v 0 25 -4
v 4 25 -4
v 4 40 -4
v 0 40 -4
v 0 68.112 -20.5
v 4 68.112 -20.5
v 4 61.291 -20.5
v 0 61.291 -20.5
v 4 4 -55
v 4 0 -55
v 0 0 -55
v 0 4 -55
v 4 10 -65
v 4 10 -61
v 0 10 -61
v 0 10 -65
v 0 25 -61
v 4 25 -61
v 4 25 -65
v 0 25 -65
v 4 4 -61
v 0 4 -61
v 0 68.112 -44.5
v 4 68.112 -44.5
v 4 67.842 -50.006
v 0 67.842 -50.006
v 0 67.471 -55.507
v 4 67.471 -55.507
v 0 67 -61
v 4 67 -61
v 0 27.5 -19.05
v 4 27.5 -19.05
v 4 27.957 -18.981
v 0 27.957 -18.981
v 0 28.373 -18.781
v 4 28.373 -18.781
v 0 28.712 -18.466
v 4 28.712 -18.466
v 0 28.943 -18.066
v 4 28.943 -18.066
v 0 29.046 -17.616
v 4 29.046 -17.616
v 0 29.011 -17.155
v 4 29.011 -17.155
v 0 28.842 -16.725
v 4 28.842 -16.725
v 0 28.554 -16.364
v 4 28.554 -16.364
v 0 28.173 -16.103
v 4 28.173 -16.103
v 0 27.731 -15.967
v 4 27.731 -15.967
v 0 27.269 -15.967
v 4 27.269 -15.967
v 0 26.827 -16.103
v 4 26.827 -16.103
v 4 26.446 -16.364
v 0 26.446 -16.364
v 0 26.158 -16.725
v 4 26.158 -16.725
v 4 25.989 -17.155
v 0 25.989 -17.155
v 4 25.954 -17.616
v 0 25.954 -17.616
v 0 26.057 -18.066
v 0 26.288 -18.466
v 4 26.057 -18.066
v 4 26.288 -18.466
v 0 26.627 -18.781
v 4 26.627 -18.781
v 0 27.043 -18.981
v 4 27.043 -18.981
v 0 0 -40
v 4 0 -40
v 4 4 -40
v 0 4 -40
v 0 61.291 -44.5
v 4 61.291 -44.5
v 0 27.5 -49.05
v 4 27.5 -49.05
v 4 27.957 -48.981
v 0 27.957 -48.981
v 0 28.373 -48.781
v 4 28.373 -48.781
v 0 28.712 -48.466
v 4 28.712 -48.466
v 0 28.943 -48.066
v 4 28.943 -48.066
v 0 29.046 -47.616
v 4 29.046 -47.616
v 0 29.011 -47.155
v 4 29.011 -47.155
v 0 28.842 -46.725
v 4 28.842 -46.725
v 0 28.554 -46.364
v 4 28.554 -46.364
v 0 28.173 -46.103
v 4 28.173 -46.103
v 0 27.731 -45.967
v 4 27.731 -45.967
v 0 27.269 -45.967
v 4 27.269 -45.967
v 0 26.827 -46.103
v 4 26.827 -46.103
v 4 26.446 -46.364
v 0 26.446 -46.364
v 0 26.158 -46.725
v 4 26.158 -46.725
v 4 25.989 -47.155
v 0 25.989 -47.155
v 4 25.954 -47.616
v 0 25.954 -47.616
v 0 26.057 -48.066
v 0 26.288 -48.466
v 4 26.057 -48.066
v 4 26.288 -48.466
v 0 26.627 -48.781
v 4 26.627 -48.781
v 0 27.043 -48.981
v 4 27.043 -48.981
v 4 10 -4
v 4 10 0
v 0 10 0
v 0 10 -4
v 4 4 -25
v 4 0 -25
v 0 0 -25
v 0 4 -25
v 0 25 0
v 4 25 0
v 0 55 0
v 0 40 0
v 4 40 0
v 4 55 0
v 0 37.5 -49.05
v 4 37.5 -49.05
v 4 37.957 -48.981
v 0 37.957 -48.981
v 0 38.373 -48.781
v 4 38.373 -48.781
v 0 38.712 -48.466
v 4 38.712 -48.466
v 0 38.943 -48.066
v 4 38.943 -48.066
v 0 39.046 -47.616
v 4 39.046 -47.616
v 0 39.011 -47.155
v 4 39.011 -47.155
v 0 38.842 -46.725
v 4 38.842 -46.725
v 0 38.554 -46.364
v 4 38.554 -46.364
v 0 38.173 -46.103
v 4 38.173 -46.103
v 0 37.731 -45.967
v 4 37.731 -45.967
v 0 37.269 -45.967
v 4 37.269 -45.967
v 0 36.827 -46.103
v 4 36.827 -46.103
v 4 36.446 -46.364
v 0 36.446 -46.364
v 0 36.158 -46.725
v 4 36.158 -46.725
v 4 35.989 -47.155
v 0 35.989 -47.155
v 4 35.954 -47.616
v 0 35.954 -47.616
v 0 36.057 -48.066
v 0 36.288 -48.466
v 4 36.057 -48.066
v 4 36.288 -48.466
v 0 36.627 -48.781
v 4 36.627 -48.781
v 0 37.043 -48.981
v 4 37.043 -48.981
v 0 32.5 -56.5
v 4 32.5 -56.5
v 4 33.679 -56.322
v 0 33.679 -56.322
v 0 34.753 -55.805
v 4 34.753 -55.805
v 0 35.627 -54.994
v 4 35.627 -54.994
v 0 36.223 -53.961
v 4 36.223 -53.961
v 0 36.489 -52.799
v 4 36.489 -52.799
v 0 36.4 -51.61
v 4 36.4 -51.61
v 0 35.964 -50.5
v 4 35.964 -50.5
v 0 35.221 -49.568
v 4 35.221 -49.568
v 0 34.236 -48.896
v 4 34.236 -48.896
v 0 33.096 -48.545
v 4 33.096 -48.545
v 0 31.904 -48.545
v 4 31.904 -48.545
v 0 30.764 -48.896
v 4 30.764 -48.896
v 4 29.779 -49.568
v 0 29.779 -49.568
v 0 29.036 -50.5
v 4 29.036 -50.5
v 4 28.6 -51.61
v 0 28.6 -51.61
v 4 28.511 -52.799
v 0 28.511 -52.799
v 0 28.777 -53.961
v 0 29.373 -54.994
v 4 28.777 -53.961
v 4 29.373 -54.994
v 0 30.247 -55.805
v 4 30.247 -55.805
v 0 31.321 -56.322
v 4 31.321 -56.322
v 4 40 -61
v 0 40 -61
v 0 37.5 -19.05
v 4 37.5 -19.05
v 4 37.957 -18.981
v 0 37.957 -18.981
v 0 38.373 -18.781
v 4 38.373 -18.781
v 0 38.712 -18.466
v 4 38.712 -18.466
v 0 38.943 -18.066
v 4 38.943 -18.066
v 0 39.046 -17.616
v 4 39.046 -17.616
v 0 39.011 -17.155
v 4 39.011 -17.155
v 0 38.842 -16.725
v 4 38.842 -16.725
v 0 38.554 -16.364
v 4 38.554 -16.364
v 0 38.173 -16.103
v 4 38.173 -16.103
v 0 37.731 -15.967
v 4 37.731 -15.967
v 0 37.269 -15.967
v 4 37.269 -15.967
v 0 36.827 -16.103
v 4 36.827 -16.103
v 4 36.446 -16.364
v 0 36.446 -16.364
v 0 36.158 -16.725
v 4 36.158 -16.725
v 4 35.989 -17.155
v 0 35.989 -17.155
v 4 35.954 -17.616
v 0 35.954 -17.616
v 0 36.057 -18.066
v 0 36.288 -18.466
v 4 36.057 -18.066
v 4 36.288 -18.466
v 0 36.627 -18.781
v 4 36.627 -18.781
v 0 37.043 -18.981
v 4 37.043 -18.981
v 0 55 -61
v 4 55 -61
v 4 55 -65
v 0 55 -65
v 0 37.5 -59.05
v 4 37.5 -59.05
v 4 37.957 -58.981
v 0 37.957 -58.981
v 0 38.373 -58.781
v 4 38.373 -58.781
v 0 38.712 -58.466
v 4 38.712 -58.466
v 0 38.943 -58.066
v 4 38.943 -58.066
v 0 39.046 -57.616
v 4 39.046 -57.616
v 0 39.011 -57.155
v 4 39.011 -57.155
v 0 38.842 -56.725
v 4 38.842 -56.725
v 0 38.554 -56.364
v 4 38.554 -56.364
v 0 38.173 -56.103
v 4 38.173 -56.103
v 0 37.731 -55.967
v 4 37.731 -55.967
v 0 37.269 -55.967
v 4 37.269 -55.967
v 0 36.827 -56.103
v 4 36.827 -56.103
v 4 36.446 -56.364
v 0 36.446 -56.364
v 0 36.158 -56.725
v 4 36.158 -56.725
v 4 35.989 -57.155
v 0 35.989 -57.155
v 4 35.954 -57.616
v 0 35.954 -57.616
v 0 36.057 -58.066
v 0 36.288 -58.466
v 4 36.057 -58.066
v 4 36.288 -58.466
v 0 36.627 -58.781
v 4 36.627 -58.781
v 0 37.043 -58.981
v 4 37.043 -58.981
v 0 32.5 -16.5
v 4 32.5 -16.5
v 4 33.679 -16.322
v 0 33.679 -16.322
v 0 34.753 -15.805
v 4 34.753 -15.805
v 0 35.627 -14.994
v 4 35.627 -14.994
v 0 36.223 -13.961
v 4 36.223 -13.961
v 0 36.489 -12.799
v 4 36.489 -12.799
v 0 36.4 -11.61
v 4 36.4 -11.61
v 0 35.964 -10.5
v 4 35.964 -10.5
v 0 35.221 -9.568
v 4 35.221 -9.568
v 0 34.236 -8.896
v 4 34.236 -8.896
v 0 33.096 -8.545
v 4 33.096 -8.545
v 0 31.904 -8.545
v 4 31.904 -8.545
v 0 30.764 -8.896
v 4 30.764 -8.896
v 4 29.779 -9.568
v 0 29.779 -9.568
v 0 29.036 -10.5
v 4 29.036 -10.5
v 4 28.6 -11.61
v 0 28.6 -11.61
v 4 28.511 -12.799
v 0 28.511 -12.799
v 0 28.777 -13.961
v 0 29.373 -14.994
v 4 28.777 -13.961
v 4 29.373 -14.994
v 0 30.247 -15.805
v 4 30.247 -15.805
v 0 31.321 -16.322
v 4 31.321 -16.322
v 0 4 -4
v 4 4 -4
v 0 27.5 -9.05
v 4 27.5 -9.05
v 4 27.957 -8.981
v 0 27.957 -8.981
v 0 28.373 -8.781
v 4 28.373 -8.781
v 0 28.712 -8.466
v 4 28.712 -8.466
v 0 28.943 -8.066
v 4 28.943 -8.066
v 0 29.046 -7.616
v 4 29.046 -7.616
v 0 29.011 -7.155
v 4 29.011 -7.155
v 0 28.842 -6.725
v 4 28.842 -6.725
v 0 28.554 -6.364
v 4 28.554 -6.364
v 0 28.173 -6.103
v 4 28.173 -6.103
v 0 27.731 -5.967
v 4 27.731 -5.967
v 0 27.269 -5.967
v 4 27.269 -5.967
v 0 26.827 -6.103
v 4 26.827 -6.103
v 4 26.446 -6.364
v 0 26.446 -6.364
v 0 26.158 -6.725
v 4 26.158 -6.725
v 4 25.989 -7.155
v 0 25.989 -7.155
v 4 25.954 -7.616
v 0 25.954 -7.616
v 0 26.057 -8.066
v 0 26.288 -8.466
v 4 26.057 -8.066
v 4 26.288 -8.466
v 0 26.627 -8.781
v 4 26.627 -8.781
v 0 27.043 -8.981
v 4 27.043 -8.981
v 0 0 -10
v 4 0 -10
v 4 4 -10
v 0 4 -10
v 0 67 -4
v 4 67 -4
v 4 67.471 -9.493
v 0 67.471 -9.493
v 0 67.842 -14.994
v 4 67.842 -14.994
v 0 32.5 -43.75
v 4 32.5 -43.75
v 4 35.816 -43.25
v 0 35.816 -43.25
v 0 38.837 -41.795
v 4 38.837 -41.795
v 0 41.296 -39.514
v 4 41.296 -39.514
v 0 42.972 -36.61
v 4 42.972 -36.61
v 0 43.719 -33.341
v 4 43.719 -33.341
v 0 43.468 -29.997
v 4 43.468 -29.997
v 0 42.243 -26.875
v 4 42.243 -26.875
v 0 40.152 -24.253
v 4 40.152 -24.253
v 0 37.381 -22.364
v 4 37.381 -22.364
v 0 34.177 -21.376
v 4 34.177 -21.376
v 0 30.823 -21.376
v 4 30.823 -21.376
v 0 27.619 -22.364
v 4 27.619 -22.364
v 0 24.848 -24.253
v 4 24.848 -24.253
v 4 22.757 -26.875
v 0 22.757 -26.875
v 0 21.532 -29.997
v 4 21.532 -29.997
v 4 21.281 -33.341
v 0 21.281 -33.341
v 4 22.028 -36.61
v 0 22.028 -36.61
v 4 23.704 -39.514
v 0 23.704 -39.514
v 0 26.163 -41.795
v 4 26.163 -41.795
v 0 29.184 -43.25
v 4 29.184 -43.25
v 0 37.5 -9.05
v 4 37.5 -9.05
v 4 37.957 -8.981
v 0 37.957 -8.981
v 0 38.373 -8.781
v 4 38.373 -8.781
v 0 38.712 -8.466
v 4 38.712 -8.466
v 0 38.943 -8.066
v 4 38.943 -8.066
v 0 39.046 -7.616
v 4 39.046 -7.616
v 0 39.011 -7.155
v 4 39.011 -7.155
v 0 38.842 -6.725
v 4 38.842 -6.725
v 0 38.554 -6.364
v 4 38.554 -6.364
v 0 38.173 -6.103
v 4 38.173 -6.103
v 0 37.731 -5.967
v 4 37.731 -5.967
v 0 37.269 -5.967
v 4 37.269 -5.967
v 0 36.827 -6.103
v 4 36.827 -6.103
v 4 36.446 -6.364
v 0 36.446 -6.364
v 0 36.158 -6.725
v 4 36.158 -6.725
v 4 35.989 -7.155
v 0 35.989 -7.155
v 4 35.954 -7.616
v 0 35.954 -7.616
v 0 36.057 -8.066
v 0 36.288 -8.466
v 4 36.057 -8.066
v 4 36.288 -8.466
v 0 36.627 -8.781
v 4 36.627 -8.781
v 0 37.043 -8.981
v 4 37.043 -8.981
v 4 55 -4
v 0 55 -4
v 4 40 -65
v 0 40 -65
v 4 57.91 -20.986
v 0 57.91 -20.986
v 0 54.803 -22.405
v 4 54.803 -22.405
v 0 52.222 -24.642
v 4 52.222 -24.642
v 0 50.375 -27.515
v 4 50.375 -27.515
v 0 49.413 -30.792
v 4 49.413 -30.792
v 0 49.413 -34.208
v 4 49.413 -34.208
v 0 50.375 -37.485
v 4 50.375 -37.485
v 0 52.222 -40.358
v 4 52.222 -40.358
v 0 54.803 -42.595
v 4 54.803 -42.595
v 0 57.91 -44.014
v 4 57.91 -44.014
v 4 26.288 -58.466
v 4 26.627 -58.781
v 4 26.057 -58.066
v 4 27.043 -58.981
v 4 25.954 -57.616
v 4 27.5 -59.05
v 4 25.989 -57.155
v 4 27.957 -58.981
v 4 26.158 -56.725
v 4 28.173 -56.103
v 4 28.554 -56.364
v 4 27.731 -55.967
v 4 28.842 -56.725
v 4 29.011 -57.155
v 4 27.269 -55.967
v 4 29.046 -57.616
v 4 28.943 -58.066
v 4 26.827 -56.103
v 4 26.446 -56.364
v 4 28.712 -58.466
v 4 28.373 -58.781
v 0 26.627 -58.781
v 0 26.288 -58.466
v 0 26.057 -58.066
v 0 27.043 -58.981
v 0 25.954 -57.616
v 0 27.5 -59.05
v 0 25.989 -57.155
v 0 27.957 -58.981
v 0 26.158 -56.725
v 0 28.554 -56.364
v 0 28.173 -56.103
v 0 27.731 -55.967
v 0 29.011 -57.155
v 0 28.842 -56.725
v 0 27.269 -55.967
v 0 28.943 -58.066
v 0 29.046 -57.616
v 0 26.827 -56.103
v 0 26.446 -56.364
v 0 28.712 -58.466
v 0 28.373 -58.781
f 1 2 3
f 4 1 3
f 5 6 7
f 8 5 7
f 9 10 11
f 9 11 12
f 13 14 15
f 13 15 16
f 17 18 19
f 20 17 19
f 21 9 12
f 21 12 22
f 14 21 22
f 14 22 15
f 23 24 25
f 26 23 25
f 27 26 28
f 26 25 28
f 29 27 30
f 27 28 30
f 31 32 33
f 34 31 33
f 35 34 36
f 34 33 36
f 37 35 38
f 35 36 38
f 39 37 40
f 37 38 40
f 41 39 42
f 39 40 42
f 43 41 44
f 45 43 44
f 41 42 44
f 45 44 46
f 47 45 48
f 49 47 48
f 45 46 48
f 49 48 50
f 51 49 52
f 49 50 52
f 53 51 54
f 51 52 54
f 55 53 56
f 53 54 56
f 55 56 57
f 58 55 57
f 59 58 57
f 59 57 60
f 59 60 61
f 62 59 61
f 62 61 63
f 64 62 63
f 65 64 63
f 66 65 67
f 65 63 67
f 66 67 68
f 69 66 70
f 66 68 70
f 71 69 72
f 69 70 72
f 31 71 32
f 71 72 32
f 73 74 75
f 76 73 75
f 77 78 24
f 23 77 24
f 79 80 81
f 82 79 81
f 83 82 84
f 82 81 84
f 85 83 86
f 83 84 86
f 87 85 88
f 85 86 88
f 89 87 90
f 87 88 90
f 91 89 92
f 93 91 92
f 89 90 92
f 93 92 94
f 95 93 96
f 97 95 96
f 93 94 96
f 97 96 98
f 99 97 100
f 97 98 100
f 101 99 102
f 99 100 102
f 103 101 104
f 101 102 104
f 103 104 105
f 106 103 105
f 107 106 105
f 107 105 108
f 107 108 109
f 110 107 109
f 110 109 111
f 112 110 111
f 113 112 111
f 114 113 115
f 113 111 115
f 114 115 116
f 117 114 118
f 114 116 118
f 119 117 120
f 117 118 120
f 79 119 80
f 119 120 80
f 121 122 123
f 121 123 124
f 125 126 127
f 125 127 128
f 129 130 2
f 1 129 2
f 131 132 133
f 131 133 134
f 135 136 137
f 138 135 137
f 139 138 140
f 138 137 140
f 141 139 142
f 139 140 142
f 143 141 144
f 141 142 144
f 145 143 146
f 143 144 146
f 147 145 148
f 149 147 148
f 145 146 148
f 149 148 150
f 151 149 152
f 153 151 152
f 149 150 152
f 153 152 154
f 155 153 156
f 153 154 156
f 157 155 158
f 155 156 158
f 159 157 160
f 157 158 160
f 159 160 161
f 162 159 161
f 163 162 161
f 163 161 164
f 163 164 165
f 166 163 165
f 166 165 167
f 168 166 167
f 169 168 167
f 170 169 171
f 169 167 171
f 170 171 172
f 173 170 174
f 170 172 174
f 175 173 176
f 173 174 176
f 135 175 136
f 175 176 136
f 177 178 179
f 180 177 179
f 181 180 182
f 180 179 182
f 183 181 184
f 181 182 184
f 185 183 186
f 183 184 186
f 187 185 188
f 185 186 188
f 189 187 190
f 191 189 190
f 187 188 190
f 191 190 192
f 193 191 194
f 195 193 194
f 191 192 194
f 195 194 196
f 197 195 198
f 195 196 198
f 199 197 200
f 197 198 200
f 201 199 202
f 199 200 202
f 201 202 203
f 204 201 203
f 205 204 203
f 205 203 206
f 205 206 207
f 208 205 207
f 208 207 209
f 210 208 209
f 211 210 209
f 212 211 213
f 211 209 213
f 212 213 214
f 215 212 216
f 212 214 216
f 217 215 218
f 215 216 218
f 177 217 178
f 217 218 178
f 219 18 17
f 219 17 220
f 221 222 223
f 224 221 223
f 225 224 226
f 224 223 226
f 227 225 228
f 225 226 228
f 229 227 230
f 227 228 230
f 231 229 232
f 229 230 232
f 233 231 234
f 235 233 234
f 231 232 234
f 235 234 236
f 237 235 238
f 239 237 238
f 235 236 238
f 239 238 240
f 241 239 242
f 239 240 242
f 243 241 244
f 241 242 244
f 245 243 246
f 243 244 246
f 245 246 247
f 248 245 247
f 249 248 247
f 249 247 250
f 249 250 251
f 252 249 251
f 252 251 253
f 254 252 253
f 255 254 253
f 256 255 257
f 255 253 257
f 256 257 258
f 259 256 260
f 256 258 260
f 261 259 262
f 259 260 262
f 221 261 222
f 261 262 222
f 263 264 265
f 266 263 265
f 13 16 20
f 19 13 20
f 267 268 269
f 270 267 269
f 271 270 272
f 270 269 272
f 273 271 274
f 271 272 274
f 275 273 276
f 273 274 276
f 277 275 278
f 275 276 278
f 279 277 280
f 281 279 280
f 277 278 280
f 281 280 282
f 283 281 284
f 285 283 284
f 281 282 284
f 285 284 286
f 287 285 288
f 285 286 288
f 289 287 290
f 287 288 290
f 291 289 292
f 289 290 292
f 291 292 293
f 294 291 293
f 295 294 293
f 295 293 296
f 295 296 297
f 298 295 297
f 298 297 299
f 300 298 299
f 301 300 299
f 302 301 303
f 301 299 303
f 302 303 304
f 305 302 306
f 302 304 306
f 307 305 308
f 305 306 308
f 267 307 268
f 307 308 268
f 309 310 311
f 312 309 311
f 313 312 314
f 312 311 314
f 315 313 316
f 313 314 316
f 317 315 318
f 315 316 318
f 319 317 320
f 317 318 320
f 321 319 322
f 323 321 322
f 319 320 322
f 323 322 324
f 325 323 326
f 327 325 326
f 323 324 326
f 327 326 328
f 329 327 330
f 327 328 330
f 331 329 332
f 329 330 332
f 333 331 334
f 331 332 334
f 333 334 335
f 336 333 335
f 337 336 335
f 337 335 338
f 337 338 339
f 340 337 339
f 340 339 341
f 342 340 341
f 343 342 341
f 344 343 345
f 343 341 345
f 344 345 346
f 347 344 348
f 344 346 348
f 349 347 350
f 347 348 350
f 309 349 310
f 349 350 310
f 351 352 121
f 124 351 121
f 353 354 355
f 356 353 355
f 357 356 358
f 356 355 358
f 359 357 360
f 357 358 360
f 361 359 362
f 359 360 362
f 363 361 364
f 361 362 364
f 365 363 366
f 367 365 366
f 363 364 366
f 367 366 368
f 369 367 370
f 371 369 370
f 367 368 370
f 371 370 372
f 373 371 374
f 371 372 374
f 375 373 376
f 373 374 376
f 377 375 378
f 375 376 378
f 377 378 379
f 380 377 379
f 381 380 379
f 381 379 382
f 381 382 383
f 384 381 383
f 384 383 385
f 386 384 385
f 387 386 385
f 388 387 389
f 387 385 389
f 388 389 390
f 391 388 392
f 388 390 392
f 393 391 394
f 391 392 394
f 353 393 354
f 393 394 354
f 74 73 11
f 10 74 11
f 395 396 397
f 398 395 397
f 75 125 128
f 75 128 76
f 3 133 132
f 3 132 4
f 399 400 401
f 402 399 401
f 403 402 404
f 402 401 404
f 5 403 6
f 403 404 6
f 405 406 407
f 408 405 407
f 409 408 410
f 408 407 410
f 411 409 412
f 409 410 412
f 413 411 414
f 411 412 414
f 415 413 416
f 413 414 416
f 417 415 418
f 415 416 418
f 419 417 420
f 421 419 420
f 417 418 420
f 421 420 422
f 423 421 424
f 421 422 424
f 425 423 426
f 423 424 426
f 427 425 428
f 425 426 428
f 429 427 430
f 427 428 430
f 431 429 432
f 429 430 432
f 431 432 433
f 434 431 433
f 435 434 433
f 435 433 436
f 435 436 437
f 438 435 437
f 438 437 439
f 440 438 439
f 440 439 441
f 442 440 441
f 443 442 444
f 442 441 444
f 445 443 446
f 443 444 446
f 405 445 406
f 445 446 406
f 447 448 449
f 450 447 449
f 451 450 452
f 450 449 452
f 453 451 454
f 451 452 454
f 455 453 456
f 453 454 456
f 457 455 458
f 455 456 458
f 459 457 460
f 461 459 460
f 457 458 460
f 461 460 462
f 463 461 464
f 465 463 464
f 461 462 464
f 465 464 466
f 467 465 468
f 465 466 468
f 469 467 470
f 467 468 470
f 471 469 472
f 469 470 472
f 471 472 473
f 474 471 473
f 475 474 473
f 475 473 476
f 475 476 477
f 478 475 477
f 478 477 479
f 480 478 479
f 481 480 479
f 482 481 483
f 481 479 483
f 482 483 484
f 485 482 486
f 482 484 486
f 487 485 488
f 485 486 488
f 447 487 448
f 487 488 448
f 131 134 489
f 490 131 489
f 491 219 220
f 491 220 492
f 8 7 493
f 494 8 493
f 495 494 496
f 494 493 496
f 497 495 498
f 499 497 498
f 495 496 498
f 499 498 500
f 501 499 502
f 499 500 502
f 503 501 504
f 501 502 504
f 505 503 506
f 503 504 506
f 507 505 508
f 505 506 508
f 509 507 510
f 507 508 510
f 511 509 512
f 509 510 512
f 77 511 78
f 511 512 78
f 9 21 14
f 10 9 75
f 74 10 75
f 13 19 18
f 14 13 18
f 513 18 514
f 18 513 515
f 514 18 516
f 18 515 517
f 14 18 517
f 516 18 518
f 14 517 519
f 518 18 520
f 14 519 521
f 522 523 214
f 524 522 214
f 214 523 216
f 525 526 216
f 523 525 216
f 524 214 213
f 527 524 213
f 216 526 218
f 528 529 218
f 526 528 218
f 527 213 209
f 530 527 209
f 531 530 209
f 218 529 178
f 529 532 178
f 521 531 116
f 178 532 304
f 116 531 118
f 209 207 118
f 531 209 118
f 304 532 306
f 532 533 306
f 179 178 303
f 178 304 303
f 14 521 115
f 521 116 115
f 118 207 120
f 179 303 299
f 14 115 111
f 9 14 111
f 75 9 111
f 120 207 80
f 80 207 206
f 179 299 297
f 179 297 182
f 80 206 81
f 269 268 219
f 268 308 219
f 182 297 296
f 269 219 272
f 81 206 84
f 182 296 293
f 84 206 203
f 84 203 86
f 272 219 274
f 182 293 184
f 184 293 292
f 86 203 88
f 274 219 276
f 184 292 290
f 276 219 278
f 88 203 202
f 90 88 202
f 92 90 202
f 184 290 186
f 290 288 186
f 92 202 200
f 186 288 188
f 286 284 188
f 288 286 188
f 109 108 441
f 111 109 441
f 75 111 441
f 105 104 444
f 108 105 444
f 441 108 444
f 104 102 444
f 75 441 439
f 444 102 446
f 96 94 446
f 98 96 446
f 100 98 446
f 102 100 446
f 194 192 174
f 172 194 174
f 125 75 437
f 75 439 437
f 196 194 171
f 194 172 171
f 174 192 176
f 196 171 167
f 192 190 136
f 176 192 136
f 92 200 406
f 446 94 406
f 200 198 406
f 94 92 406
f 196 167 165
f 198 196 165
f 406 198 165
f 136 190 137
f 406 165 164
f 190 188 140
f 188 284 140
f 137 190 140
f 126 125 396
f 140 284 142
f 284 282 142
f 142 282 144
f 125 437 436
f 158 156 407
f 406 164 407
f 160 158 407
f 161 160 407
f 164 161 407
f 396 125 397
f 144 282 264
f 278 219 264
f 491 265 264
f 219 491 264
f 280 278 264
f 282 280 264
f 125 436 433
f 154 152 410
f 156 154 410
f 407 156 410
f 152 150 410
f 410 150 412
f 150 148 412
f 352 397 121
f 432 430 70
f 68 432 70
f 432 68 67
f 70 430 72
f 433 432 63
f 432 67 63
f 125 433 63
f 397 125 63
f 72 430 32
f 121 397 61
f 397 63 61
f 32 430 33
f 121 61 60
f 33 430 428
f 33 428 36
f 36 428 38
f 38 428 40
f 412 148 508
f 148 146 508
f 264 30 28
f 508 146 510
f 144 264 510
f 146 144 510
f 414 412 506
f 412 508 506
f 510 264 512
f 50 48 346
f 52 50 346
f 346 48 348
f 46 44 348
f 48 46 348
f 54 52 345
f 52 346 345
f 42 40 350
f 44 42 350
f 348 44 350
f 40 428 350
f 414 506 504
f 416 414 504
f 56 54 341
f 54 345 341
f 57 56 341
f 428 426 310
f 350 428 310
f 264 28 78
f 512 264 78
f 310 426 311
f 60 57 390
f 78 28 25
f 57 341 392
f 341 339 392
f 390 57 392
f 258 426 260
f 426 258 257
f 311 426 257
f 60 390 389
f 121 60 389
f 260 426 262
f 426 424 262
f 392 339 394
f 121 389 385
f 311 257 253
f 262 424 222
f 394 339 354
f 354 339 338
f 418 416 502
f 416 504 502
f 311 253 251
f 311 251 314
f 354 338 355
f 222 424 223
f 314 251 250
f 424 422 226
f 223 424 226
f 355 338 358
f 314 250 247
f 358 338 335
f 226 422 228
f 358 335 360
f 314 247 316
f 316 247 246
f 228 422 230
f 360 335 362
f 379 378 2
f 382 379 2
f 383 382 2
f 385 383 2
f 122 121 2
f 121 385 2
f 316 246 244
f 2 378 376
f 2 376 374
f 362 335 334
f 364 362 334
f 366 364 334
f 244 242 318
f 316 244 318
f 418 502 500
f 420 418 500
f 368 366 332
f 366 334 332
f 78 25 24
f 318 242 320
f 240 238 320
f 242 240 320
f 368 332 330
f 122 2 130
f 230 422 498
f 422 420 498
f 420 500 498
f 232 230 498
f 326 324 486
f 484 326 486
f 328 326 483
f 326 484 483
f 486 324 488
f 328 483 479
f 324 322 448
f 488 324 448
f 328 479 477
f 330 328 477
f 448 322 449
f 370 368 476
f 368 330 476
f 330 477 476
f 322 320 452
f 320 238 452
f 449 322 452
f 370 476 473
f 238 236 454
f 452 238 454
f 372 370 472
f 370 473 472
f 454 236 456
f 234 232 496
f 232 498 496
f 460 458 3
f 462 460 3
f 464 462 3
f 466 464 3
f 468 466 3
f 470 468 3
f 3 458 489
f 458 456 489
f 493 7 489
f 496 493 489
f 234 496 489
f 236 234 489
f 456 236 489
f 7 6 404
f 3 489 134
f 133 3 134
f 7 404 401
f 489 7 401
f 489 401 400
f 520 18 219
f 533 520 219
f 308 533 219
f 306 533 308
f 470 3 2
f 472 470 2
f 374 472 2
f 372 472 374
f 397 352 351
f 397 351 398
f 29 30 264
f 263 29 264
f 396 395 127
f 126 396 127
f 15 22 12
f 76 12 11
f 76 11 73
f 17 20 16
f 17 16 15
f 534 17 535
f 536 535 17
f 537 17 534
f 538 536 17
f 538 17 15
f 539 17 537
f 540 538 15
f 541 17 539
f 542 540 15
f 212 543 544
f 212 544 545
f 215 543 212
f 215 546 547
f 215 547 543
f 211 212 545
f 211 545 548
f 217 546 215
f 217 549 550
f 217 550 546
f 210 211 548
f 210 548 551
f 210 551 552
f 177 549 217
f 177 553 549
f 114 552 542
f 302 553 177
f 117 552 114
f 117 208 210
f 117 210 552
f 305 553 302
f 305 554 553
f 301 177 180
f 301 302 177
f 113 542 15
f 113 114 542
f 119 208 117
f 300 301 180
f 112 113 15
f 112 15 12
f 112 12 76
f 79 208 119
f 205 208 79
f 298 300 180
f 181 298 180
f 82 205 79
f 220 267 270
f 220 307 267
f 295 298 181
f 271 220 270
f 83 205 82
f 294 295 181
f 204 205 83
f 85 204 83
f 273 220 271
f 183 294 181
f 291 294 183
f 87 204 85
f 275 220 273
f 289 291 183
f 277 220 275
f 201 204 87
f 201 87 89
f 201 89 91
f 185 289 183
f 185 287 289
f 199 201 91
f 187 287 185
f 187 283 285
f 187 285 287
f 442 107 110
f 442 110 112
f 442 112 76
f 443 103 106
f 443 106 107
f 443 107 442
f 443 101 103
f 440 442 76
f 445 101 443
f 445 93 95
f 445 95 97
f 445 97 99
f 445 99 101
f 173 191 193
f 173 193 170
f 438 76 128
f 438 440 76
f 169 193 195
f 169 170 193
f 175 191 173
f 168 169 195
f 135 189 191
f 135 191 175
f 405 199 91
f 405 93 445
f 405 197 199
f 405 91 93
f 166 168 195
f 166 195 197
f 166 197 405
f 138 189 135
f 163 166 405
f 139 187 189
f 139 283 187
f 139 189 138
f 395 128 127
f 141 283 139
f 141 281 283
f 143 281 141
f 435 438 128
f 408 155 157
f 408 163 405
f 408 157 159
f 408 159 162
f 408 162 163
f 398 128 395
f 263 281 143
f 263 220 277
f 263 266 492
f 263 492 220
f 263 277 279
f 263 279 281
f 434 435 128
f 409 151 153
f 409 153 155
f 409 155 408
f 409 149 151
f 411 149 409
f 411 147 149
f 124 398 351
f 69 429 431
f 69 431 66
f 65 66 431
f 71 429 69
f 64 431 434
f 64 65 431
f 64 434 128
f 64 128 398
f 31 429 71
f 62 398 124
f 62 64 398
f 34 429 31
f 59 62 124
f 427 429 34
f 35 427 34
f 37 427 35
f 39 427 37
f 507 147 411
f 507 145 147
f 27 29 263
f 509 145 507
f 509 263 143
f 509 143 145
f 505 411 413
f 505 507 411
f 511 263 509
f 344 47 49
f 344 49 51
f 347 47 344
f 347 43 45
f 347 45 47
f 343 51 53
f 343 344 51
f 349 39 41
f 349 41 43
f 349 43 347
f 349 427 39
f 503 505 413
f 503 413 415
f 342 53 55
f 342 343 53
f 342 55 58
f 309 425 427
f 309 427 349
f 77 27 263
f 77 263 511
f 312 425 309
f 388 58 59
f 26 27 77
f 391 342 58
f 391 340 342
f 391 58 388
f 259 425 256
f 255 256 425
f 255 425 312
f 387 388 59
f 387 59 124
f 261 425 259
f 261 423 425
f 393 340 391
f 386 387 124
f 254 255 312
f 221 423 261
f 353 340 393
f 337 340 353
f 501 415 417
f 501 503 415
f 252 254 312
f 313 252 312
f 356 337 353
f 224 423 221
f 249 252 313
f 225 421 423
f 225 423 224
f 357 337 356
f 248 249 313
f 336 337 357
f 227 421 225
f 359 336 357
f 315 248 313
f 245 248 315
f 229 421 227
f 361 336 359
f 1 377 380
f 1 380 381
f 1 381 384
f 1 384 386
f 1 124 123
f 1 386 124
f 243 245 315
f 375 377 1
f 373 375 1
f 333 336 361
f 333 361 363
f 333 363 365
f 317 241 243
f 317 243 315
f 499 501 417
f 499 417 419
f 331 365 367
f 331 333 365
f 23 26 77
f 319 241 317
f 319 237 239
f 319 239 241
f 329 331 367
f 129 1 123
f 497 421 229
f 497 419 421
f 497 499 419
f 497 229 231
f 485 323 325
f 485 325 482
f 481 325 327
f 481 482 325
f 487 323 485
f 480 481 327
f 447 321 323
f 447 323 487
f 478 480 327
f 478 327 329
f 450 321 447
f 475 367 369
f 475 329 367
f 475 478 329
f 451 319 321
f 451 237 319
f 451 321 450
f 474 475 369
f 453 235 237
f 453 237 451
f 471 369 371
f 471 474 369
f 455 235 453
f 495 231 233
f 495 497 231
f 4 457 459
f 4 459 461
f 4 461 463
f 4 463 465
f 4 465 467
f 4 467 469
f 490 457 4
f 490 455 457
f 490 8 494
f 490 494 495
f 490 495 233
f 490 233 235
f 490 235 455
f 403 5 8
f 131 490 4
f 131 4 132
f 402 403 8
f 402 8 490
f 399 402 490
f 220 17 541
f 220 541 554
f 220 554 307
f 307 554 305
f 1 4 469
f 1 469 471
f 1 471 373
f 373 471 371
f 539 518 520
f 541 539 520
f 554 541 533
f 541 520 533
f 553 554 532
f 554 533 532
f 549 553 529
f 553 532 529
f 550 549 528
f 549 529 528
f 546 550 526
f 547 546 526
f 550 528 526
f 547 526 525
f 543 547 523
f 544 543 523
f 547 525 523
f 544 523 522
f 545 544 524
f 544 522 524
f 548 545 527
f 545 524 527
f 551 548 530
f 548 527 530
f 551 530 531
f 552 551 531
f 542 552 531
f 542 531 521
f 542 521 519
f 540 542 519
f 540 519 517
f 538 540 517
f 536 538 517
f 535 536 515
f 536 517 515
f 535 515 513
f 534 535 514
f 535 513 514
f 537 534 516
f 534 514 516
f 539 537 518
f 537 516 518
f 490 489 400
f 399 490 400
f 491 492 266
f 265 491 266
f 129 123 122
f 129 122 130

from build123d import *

# Parameters (mm, degrees)
SKETCH1_W           = 65
SKETCH1_H           = 65
BOSS_EXTRUDE1_DEPTH = 4
SKETCH2_R           = 11.25
CUT_EXTRUDE1_DEPTH  = 4
SKETCH3_W           = 10
SKETCH3_H           = 4
SKETCH3_W_2         = 15
CUT_EXTRUDE2_DEPTH  = 4
SKETCH5_W           = 4
SKETCH5_H           = 6
SKETCH5_H_2         = 15
CUT_EXTRUDE3_DEPTH  = 4
SKETCH6_R           = 1.55
SKETCH6_R_2         = 4
CUT_EXTRUDE4_DEPTH  = 4
BOSS_EXTRUDE3_DEPTH = 4
CUT_EXTRUDE6_DEPTH  = 4


with BuildPart() as part:
    # Sketch1 → Boss-Extrude1 (new body)
    with BuildSketch(Plane(origin=(0, 0, 0), x_dir=(0, 0, -1), z_dir=(1, 0, 0))):
        with Locations((32.5, 32.5)):
            Rectangle(SKETCH1_W, SKETCH1_H)
    extrude(amount=BOSS_EXTRUDE1_DEPTH)

    # Sketch2 → Cut-Extrude1 (cut)
    with BuildSketch(Plane(origin=(4, 0, 0), x_dir=(0, 0, -1), z_dir=(1, 0, 0))):
        with Locations((32.5, 32.5)):
            Circle(SKETCH2_R)
    extrude(amount=-CUT_EXTRUDE1_DEPTH, mode=Mode.SUBTRACT)

    # Sketch3 → Cut-Extrude2 (cut)
    with BuildSketch(Plane(origin=(4, 0, 0), x_dir=(0, 0, -1), z_dir=(1, 0, 0))):
        with Locations((5, 63)):
            Rectangle(SKETCH3_W, SKETCH3_H)
        with Locations((32.5, 63)):
            Rectangle(SKETCH3_W_2, SKETCH3_H)
        with Locations((60, 63)):
            Rectangle(SKETCH3_W, SKETCH3_H)
        with Locations((60, 2)):
            Rectangle(SKETCH3_W, SKETCH3_H)
        with Locations((32.5, 2)):
            Rectangle(SKETCH3_W_2, SKETCH3_H)
        with Locations((5, 2)):
            Rectangle(SKETCH3_W, SKETCH3_H)
    extrude(amount=-CUT_EXTRUDE2_DEPTH, mode=Mode.SUBTRACT)

    # Sketch5 → Cut-Extrude3 (cut)
    with BuildSketch(Plane(origin=(4, 0, 0), x_dir=(0, 0, -1), z_dir=(1, 0, 0))):
        with Locations((2, 58)):
            Rectangle(SKETCH5_W, SKETCH5_H)
        with Locations((2, 32.5)):
            Rectangle(SKETCH5_W, SKETCH5_H_2)
        with Locations((2, 7)):
            Rectangle(SKETCH5_W, SKETCH5_H)
        with Locations((63, 7)):
            Rectangle(SKETCH5_W, SKETCH5_H)
        with Locations((63, 32.5)):
            Rectangle(SKETCH5_W, SKETCH5_H_2)
        with Locations((63, 58)):
            Rectangle(SKETCH5_W, SKETCH5_H)
    extrude(amount=-CUT_EXTRUDE3_DEPTH, mode=Mode.SUBTRACT)

    # Sketch6 → Cut-Extrude4 (cut)
    with BuildSketch(Plane(origin=(4, 0, 0), x_dir=(0, 0, -1), z_dir=(1, 0, 0))):
        with Locations((7.5, 37.5)):
            Circle(SKETCH6_R)
        with Locations((17.5, 37.5)):
            Circle(SKETCH6_R)
        with Locations((17.5, 27.5)):
            Circle(SKETCH6_R)
        with Locations((12.5, 32.5)):
            Circle(SKETCH6_R_2)
        with Locations((7.5, 27.5)):
            Circle(SKETCH6_R)
        with Locations((52.5, 32.5)):
            Circle(SKETCH6_R_2)
        with Locations((47.5, 27.5)):
            Circle(SKETCH6_R)
        with Locations((47.5, 37.5)):
            Circle(SKETCH6_R)
        with Locations((57.5, 37.5)):
            Circle(SKETCH6_R)
        with Locations((57.5, 27.5)):
            Circle(SKETCH6_R)
    extrude(amount=-CUT_EXTRUDE4_DEPTH, mode=Mode.SUBTRACT)

    # Sketch12 → Boss-Extrude3 (add)
    with BuildSketch(Plane(origin=(4, 0, 0), x_dir=(0, 0, -1), z_dir=(1, 0, 0))):
        with BuildLine():
            Line((4, 67), (4, 61))
            Line((4, 61), (10, 61))
            Line((10, 61), (10, 65))
            Line((10, 65), (25, 65))
            Line((25, 65), (25, 61))
            Line((25, 61), (40, 61))
            Line((40, 61), (40, 65))
            Line((40, 65), (55, 65))
            Line((55, 65), (55, 61))
            Line((55, 61), (61, 61))
            Line((61, 61), (61, 67))
            ThreePointArc((61, 67), (32.5, 68.351492738), (4, 67))
        make_face()
    extrude(amount=-BOSS_EXTRUDE3_DEPTH)

    # Sketch11 → Cut-Extrude6 (cut)
    with BuildSketch(Plane(origin=(4, 0, 0), x_dir=(0, 0, -1), z_dir=(1, 0, 0))):
        with BuildLine():
            ThreePointArc((20.5, 61.291011979), (32.5, 49.291011979), (44.5, 61.291011979))
            Line((44.5, 61.291011979), (44.5, 74.592318289))
            Line((44.5, 74.592318289), (20.5, 74.592318289))
            Line((20.5, 74.592318289), (20.5, 61.291011979))
        make_face()
    extrude(amount=-CUT_EXTRUDE6_DEPTH, mode=Mode.SUBTRACT)


solid = part.part
